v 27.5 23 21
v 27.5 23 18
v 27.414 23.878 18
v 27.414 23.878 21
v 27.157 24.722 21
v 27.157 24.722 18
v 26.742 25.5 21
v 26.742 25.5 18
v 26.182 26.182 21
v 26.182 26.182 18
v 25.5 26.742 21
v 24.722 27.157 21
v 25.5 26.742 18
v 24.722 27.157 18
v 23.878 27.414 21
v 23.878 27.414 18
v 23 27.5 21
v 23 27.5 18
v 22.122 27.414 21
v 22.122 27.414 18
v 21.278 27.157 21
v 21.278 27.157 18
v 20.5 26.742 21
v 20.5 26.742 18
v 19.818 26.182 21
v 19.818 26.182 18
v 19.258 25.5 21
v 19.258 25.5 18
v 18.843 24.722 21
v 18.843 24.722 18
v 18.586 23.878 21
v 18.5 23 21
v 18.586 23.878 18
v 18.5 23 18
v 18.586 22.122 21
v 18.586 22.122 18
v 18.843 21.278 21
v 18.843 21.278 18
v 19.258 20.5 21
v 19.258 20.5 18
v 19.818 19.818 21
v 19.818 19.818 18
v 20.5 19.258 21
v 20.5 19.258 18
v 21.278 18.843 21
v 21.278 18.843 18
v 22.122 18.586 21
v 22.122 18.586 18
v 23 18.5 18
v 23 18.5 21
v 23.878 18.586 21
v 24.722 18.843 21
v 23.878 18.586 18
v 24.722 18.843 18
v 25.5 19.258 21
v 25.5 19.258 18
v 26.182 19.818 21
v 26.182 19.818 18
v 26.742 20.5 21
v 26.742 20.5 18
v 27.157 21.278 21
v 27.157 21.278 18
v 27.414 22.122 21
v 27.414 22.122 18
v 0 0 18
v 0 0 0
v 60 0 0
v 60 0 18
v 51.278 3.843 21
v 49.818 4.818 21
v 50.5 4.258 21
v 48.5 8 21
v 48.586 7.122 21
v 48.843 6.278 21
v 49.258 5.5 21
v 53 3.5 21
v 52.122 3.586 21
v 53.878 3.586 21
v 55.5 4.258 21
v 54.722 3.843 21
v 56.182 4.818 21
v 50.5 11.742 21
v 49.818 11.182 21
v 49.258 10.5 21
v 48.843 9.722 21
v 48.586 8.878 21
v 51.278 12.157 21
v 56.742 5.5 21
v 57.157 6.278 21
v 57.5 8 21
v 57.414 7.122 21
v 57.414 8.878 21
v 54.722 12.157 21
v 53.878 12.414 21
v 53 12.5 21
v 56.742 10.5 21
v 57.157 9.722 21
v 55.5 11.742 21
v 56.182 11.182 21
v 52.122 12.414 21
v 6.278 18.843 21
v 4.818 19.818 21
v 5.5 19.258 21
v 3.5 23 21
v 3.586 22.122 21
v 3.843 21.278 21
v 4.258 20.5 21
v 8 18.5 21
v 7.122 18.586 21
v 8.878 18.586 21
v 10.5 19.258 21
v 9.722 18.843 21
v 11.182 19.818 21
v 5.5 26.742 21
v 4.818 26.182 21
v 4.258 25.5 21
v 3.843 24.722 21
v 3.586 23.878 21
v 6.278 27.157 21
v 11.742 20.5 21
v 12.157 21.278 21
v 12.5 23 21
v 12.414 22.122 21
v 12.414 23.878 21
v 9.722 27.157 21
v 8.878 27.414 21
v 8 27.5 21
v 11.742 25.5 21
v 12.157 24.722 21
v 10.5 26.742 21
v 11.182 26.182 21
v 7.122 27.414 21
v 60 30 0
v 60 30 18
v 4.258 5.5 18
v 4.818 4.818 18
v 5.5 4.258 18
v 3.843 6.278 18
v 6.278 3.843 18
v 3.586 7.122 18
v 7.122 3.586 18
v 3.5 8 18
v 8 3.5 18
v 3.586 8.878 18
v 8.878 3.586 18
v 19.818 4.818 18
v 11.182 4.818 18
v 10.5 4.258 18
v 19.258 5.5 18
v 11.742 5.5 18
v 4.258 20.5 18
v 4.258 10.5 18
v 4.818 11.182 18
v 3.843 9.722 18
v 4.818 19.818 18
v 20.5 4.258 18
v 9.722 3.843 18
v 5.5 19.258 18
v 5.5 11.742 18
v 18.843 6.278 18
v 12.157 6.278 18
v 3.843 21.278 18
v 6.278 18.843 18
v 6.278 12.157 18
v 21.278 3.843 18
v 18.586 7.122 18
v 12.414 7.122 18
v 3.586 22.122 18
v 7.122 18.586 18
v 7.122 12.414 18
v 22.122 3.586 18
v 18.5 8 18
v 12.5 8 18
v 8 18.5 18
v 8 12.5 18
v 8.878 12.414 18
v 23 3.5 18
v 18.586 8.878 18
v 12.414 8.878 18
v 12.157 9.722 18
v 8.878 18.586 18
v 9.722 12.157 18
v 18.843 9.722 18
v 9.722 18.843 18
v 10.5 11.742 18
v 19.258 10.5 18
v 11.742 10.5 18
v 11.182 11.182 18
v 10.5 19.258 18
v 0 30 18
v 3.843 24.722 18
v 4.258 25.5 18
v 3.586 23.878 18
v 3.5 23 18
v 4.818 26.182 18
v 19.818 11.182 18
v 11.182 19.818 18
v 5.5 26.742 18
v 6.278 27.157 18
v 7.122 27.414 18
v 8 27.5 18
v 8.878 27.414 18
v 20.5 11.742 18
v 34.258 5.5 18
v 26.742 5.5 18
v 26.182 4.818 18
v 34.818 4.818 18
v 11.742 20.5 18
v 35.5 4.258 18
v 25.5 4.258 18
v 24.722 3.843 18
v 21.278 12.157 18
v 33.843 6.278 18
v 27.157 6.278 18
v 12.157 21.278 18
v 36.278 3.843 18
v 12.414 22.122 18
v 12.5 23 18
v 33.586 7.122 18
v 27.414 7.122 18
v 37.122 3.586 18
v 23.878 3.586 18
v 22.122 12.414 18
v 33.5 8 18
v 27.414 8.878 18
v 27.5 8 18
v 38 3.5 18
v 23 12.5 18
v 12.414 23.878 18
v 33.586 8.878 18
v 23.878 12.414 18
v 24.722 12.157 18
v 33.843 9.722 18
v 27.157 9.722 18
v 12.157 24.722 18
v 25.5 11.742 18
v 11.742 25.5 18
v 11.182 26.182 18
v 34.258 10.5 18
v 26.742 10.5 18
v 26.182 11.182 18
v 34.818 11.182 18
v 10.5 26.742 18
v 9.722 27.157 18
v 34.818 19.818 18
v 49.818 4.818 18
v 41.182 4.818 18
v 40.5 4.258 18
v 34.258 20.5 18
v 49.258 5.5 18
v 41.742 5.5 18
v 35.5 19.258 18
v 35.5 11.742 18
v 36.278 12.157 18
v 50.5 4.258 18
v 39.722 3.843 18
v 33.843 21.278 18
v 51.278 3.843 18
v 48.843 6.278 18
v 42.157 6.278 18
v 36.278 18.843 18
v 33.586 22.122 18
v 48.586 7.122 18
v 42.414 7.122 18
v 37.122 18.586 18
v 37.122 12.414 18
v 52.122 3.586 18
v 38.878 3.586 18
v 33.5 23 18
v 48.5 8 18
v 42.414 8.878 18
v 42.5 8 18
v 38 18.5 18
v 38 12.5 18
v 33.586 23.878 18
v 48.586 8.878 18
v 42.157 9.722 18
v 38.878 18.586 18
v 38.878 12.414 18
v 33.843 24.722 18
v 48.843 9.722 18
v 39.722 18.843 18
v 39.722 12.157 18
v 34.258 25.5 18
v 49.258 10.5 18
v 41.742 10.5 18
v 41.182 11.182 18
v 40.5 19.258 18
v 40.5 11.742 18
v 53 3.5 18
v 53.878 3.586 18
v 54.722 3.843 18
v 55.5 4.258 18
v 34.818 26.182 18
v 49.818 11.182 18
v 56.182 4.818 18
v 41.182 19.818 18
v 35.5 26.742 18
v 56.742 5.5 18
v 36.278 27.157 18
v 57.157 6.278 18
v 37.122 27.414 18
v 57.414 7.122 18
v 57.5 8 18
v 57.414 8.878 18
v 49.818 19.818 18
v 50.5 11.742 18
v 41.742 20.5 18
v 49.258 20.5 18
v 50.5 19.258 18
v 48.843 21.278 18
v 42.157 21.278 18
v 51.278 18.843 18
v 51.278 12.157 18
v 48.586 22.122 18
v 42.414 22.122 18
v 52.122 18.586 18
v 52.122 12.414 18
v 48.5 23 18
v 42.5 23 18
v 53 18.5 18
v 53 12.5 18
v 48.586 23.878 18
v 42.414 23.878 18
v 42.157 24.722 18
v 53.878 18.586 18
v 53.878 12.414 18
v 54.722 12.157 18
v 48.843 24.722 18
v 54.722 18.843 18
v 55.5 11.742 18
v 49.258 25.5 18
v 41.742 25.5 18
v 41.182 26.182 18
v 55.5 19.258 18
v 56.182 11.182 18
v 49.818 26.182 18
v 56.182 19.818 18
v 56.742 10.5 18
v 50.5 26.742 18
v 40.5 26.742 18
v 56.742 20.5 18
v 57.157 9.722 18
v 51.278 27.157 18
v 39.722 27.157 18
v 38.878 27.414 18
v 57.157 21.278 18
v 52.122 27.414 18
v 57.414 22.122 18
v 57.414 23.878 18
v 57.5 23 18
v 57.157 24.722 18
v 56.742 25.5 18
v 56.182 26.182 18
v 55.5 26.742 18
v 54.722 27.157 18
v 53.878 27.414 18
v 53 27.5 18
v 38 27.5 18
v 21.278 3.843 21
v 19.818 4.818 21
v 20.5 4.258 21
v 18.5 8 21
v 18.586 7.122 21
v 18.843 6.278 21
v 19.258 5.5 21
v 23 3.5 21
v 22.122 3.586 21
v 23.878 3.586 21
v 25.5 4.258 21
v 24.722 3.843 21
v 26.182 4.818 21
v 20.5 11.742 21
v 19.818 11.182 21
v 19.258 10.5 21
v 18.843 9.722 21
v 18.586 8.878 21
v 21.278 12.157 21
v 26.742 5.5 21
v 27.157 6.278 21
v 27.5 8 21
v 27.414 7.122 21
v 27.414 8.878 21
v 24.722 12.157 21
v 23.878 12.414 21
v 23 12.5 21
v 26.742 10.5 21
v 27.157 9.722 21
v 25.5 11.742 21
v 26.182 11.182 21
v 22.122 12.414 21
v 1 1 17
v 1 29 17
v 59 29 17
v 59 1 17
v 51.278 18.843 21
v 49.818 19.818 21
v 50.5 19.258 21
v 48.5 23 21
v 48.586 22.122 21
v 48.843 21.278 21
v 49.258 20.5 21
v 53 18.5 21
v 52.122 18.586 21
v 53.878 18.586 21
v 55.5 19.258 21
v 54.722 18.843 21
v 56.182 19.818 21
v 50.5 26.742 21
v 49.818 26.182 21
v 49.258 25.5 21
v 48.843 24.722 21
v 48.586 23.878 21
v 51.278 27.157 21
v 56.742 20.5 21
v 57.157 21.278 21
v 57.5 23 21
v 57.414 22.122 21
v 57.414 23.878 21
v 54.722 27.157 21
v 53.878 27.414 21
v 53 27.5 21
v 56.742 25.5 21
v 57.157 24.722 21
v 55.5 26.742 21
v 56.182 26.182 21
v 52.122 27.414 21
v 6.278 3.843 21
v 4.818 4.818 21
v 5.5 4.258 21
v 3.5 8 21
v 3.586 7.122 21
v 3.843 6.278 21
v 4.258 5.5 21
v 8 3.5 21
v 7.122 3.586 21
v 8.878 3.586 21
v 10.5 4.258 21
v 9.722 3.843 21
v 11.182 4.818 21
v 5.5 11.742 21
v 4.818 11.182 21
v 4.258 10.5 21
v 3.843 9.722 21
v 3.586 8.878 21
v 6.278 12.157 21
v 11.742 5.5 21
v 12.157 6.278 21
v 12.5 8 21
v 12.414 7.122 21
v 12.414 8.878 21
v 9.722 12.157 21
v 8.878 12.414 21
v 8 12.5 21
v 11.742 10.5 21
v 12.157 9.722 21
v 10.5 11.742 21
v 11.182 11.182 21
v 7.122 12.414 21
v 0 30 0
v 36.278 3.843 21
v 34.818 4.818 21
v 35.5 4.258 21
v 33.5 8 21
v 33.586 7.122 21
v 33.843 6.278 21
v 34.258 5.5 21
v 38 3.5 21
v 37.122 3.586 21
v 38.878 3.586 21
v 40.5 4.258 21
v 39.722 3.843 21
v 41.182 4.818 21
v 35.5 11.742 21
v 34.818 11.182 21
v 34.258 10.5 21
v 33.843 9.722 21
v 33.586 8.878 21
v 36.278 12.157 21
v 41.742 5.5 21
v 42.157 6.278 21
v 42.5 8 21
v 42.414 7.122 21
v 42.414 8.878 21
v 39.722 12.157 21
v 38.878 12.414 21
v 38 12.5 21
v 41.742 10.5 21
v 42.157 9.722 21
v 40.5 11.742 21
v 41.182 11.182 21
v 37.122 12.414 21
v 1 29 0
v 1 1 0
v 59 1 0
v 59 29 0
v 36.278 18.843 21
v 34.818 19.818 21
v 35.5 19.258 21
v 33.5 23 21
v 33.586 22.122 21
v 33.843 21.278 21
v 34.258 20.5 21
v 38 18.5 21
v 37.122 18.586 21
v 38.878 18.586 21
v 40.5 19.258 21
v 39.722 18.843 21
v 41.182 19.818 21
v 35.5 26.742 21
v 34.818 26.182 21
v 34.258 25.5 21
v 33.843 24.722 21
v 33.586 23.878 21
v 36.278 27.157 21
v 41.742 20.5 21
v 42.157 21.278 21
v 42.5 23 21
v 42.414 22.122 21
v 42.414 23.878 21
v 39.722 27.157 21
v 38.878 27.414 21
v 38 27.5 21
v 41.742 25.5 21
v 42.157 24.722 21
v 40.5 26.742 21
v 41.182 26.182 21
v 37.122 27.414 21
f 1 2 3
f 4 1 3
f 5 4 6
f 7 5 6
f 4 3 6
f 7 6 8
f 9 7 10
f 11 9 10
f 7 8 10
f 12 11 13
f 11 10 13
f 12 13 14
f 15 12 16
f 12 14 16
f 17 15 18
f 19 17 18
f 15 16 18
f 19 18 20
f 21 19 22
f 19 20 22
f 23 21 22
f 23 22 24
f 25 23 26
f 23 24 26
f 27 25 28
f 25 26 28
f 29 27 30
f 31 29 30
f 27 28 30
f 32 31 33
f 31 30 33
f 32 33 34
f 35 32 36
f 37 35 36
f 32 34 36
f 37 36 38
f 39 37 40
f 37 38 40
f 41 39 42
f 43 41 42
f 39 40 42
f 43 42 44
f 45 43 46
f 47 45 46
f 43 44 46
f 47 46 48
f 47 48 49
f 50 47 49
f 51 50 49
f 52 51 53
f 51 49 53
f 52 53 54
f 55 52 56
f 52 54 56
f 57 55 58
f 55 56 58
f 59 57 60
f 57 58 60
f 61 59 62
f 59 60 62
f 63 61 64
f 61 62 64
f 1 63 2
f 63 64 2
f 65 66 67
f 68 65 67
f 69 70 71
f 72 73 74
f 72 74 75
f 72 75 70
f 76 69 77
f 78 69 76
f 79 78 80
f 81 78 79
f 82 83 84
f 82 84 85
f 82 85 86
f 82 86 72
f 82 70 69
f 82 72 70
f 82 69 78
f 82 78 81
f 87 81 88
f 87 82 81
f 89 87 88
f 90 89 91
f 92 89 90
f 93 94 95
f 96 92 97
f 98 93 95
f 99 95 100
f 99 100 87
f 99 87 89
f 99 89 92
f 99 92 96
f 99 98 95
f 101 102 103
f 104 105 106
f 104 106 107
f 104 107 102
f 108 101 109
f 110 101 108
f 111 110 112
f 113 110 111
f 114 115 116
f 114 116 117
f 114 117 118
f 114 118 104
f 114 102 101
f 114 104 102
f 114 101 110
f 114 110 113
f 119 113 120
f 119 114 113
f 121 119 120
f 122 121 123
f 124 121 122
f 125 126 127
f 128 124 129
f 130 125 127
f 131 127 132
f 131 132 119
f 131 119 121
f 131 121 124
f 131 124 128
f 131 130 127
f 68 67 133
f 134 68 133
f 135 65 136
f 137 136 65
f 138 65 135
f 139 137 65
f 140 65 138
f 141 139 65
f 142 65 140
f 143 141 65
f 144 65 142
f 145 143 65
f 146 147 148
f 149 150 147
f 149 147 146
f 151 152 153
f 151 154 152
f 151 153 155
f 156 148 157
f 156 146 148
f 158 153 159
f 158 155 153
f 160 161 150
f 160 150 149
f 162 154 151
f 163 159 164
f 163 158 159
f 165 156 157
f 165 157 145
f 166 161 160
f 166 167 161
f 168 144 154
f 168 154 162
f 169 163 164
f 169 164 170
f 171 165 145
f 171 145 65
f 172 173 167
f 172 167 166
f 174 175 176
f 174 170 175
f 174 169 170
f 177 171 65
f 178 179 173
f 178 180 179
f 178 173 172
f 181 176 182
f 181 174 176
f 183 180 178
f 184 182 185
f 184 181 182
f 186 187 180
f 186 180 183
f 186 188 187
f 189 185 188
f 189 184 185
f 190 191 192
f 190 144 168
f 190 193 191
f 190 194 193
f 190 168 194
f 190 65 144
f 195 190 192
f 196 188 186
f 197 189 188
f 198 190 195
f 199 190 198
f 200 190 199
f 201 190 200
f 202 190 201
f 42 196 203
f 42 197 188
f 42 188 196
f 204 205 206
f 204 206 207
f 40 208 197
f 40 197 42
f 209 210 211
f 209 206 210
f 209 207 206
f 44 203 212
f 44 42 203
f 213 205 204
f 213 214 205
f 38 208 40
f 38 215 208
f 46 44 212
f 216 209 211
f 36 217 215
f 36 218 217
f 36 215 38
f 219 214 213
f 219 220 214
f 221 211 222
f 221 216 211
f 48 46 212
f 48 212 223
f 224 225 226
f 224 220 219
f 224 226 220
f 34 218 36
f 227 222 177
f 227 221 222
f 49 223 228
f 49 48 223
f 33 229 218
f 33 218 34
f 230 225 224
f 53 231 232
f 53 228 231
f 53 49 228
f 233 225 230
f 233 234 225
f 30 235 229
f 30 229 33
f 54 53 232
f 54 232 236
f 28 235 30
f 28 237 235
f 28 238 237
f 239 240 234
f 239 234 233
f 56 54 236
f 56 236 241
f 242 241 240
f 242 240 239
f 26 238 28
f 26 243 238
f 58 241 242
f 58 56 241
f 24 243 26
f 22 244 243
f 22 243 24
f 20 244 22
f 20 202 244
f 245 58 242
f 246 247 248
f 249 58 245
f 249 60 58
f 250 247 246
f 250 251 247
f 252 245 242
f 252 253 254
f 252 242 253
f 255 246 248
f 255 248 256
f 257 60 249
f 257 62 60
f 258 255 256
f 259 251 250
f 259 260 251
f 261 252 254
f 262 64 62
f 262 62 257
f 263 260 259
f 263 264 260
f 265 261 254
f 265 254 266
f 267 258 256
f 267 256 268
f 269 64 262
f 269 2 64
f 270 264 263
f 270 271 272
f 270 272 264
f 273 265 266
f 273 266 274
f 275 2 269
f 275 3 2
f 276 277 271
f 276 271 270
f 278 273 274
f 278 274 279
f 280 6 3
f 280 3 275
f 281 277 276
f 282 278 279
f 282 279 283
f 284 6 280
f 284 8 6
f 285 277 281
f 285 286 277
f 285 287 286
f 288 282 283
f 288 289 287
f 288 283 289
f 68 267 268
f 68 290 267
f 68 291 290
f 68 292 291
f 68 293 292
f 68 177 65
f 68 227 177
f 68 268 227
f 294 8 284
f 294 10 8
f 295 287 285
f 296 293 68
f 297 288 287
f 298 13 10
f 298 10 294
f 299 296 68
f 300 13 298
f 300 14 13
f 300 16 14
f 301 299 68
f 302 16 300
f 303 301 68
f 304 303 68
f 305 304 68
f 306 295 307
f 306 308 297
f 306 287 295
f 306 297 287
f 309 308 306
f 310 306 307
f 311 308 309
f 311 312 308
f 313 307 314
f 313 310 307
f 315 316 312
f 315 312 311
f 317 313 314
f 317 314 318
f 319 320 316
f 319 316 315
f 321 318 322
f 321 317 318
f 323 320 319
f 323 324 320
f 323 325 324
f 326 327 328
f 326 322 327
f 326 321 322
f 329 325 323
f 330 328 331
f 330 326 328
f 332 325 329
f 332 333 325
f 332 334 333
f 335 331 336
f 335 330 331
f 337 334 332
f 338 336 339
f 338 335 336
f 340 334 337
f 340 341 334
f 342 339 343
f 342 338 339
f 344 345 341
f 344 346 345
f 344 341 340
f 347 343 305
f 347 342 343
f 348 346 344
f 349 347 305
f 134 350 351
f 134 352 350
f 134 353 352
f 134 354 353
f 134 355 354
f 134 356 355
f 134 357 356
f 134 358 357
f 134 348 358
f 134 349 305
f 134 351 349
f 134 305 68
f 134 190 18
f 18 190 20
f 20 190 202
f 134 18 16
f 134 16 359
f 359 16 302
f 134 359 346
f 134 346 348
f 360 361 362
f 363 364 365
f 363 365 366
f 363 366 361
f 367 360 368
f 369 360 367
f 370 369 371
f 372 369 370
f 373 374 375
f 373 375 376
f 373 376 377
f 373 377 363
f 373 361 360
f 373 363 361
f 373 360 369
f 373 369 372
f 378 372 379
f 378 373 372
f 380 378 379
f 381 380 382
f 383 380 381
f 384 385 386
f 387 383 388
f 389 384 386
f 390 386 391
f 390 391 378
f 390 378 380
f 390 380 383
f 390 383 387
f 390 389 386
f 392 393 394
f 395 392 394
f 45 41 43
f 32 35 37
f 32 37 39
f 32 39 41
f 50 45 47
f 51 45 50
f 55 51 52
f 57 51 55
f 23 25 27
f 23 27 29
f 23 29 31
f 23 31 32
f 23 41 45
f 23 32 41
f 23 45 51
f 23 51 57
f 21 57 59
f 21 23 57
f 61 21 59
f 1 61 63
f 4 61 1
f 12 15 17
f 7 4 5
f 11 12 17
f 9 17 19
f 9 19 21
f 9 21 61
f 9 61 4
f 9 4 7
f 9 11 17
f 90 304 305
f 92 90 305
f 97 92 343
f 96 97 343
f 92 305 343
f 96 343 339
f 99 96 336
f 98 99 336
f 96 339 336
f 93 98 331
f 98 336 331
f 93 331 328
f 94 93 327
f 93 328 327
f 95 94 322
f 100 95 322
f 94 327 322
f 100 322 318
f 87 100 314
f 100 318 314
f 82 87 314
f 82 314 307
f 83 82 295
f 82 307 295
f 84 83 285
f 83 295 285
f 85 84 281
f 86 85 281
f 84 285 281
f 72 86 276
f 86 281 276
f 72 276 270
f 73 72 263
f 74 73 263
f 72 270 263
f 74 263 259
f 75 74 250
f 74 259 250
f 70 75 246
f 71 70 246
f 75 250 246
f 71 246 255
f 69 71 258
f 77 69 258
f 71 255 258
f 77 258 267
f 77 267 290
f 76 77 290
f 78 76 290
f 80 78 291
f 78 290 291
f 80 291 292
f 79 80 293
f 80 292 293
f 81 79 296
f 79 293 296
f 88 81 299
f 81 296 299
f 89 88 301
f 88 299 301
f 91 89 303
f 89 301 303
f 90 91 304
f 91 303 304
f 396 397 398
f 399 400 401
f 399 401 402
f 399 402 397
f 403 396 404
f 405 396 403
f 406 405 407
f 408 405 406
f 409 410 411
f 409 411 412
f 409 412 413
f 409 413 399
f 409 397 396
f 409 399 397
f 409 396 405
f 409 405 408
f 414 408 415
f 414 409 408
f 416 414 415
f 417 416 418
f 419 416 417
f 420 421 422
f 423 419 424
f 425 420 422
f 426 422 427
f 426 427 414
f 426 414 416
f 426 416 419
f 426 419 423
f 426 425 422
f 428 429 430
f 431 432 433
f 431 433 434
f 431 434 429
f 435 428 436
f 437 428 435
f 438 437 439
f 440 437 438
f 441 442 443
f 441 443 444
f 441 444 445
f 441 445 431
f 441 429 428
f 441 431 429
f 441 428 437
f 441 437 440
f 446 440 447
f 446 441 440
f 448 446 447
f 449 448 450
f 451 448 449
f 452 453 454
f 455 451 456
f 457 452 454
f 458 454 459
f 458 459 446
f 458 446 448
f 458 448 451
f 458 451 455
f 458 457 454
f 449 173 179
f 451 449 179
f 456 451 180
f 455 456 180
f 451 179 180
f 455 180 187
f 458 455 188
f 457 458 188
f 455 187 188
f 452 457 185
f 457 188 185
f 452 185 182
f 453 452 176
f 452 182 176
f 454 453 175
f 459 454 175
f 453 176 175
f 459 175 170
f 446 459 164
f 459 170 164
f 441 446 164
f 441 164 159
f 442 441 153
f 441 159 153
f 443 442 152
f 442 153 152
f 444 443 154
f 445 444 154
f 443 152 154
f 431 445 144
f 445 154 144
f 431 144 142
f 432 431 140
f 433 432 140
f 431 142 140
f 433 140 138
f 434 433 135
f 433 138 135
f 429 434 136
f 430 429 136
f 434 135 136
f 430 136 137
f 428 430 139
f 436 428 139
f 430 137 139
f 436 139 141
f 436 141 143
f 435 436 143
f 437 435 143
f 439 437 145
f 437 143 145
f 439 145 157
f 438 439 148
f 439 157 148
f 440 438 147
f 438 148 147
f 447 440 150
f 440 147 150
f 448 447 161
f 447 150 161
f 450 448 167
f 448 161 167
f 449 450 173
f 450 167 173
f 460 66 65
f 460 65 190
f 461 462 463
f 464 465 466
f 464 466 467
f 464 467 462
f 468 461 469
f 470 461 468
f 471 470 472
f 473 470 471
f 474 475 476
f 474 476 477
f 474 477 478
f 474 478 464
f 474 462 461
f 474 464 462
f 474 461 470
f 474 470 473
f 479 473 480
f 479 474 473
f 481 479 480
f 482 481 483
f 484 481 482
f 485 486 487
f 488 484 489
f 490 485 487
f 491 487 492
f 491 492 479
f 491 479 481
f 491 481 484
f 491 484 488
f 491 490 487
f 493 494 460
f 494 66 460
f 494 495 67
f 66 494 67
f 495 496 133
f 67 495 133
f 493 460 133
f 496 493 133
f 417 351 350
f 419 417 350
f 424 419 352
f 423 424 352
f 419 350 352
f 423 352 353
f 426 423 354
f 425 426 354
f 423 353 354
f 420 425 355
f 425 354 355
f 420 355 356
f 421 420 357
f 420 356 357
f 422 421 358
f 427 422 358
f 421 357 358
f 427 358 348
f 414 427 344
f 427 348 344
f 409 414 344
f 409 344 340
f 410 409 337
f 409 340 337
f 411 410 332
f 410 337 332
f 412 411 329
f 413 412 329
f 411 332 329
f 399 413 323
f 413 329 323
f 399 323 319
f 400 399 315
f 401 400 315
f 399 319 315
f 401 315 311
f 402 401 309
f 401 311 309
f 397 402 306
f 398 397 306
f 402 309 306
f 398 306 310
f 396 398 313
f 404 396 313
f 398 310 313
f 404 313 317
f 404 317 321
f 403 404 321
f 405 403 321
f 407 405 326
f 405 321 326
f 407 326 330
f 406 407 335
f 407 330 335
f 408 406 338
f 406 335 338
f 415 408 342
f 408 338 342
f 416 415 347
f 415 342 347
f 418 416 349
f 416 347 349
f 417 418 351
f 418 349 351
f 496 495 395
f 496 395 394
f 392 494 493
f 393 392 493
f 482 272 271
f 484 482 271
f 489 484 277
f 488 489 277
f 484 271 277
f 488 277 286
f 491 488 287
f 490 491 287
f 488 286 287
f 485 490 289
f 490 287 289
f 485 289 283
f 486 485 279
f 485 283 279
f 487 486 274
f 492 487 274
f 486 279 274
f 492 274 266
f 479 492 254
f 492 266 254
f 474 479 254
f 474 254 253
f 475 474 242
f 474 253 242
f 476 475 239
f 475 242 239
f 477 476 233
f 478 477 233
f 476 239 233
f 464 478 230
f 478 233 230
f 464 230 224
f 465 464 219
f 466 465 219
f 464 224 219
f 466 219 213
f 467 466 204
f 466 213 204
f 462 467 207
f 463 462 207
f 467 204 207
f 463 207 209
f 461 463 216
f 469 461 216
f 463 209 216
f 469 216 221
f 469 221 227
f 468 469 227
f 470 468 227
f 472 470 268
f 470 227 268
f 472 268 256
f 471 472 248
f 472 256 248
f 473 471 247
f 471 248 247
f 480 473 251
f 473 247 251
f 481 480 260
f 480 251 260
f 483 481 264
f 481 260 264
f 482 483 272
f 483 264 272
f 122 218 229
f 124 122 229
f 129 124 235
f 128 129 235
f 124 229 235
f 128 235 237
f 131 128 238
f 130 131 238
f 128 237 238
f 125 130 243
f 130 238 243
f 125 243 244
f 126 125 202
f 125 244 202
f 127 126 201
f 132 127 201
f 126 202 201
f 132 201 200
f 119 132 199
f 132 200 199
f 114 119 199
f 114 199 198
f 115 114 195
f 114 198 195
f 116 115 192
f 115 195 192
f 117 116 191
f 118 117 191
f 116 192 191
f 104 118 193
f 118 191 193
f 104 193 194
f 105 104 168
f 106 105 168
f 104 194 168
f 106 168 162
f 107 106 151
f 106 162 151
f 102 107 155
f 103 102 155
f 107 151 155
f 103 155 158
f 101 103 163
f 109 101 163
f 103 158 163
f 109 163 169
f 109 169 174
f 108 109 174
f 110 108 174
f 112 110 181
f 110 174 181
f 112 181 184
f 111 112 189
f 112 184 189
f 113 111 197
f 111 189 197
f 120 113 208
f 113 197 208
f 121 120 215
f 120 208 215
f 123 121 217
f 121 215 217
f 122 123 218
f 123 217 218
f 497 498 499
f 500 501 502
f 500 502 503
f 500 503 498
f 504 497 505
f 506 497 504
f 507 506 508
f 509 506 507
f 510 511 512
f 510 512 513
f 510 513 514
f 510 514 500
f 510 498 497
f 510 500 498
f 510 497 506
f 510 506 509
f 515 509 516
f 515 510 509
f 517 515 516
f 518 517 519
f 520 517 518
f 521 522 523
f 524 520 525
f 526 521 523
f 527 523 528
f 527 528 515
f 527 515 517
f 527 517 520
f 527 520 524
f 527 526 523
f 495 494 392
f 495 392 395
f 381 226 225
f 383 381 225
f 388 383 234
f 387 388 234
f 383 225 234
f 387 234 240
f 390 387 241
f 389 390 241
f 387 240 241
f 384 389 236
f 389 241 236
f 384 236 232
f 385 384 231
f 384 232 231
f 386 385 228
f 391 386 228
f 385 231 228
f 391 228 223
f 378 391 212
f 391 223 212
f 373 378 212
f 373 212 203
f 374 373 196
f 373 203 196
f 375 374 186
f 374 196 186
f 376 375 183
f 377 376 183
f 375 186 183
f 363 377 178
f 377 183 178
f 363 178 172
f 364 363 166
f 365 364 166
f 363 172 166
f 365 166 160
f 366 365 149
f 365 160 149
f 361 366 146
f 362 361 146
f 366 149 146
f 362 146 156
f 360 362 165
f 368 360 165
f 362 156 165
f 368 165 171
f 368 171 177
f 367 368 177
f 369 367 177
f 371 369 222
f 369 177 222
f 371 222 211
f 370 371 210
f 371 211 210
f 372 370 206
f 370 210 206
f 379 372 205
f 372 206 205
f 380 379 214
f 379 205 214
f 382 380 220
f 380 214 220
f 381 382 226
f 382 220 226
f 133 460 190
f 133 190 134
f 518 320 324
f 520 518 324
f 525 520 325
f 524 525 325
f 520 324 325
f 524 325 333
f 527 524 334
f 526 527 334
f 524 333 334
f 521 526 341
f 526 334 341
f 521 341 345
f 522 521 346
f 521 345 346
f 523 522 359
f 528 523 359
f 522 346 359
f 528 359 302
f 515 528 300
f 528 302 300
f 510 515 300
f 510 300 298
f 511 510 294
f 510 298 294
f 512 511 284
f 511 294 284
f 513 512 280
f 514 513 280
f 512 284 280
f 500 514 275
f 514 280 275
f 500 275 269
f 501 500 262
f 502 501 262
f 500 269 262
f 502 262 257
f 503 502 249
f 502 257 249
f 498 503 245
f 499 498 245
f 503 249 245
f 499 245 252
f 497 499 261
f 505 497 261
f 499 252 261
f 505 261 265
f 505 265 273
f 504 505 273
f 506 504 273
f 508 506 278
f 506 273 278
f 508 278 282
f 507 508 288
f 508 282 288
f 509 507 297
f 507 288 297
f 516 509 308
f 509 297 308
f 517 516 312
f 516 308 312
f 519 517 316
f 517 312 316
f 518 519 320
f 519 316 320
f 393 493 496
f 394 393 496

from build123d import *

# Parameters (mm, degrees)
F0_W     = 60
F0_H     = 30
F1_DEPTH = 18
F2_T     = -1
F3_R     = 4.5
F4_DEPTH = 3


with BuildPart() as f1:
    # F0 (on Top) → F1 (new body)
    with BuildSketch(Plane.XY):
        with Locations((30, 15)):
            Rectangle(F0_W, F0_H)
    extrude(amount=F1_DEPTH)

    # F2
    f2_openings = [f1.faces().sort_by_distance(p)[0] for p in [
        (30, 15, 0),
    ]]
    offset(amount=F2_T, openings=f2_openings)

    # F3 (on face) → F4 (join)
    with BuildSketch(Plane.XY.offset(18)):
        with Locations((8, 8)):
            Circle(F3_R)
        with Locations((23, 8)):
            Circle(F3_R)
        with Locations((8, 23)):
            Circle(F3_R)
        with Locations((23, 23)):
            Circle(F3_R)
        with Locations((38, 23)):
            Circle(F3_R)
        with Locations((53, 8)):
            Circle(F3_R)
        with Locations((38, 8)):
            Circle(F3_R)
        with Locations((53, 23)):
            Circle(F3_R)
    extrude(amount=F4_DEPTH)


solid = f1.part
